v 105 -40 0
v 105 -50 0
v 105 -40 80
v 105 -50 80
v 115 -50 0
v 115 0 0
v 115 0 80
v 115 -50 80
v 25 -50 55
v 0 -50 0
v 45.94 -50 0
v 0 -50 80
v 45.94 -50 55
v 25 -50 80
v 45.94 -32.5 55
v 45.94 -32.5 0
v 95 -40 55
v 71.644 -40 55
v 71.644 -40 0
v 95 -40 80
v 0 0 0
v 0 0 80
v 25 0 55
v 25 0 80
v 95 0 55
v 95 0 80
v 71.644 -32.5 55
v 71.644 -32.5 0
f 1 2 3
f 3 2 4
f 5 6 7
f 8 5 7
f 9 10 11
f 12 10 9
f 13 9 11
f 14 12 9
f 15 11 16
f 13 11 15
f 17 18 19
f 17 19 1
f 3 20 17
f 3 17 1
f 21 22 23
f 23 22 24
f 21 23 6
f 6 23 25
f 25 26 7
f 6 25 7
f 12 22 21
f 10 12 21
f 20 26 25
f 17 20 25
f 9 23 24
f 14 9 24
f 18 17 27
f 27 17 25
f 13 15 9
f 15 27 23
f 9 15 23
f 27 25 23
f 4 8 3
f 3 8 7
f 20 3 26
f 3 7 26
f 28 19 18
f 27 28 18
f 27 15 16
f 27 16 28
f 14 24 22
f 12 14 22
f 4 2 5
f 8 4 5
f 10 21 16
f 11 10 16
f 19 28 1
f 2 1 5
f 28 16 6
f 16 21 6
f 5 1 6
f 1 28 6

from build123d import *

# Parameters (mm, degrees)
F1_DEPTH = 50
F2_W     = 25.703896
F2_H     = 55
F3_DEPTH = 17.5
F4_DEPTH = 10


with BuildPart() as f1:
    # F0 (on Front) → F1 (new body)
    with BuildSketch(Plane.XZ):
        Polygon((25, 80), (0, 80), (0, 0), (115, 0), (115, 80), (95, 80), (95, 55), (25, 55), align=None)
    extrude(amount=F1_DEPTH)

    # F2 (on face) → F3 (cut, symmetric)
    with BuildSketch(Plane.XZ.offset(50)):
        with Locations((58.791665, 27.5)):
            Rectangle(F2_W, F2_H)
    extrude(amount=F3_DEPTH, both=True, mode=Mode.SUBTRACT)

    # F2 (on face) → F4 (cut)
    with BuildSketch(Plane.XZ.offset(50)):
        Polygon((95, 55), (71.643613, 55), (71.643613, 0), (105, 0), (105, 80), (95, 80), align=None)
    extrude(amount=-F4_DEPTH, mode=Mode.SUBTRACT)


solid = f1.part
